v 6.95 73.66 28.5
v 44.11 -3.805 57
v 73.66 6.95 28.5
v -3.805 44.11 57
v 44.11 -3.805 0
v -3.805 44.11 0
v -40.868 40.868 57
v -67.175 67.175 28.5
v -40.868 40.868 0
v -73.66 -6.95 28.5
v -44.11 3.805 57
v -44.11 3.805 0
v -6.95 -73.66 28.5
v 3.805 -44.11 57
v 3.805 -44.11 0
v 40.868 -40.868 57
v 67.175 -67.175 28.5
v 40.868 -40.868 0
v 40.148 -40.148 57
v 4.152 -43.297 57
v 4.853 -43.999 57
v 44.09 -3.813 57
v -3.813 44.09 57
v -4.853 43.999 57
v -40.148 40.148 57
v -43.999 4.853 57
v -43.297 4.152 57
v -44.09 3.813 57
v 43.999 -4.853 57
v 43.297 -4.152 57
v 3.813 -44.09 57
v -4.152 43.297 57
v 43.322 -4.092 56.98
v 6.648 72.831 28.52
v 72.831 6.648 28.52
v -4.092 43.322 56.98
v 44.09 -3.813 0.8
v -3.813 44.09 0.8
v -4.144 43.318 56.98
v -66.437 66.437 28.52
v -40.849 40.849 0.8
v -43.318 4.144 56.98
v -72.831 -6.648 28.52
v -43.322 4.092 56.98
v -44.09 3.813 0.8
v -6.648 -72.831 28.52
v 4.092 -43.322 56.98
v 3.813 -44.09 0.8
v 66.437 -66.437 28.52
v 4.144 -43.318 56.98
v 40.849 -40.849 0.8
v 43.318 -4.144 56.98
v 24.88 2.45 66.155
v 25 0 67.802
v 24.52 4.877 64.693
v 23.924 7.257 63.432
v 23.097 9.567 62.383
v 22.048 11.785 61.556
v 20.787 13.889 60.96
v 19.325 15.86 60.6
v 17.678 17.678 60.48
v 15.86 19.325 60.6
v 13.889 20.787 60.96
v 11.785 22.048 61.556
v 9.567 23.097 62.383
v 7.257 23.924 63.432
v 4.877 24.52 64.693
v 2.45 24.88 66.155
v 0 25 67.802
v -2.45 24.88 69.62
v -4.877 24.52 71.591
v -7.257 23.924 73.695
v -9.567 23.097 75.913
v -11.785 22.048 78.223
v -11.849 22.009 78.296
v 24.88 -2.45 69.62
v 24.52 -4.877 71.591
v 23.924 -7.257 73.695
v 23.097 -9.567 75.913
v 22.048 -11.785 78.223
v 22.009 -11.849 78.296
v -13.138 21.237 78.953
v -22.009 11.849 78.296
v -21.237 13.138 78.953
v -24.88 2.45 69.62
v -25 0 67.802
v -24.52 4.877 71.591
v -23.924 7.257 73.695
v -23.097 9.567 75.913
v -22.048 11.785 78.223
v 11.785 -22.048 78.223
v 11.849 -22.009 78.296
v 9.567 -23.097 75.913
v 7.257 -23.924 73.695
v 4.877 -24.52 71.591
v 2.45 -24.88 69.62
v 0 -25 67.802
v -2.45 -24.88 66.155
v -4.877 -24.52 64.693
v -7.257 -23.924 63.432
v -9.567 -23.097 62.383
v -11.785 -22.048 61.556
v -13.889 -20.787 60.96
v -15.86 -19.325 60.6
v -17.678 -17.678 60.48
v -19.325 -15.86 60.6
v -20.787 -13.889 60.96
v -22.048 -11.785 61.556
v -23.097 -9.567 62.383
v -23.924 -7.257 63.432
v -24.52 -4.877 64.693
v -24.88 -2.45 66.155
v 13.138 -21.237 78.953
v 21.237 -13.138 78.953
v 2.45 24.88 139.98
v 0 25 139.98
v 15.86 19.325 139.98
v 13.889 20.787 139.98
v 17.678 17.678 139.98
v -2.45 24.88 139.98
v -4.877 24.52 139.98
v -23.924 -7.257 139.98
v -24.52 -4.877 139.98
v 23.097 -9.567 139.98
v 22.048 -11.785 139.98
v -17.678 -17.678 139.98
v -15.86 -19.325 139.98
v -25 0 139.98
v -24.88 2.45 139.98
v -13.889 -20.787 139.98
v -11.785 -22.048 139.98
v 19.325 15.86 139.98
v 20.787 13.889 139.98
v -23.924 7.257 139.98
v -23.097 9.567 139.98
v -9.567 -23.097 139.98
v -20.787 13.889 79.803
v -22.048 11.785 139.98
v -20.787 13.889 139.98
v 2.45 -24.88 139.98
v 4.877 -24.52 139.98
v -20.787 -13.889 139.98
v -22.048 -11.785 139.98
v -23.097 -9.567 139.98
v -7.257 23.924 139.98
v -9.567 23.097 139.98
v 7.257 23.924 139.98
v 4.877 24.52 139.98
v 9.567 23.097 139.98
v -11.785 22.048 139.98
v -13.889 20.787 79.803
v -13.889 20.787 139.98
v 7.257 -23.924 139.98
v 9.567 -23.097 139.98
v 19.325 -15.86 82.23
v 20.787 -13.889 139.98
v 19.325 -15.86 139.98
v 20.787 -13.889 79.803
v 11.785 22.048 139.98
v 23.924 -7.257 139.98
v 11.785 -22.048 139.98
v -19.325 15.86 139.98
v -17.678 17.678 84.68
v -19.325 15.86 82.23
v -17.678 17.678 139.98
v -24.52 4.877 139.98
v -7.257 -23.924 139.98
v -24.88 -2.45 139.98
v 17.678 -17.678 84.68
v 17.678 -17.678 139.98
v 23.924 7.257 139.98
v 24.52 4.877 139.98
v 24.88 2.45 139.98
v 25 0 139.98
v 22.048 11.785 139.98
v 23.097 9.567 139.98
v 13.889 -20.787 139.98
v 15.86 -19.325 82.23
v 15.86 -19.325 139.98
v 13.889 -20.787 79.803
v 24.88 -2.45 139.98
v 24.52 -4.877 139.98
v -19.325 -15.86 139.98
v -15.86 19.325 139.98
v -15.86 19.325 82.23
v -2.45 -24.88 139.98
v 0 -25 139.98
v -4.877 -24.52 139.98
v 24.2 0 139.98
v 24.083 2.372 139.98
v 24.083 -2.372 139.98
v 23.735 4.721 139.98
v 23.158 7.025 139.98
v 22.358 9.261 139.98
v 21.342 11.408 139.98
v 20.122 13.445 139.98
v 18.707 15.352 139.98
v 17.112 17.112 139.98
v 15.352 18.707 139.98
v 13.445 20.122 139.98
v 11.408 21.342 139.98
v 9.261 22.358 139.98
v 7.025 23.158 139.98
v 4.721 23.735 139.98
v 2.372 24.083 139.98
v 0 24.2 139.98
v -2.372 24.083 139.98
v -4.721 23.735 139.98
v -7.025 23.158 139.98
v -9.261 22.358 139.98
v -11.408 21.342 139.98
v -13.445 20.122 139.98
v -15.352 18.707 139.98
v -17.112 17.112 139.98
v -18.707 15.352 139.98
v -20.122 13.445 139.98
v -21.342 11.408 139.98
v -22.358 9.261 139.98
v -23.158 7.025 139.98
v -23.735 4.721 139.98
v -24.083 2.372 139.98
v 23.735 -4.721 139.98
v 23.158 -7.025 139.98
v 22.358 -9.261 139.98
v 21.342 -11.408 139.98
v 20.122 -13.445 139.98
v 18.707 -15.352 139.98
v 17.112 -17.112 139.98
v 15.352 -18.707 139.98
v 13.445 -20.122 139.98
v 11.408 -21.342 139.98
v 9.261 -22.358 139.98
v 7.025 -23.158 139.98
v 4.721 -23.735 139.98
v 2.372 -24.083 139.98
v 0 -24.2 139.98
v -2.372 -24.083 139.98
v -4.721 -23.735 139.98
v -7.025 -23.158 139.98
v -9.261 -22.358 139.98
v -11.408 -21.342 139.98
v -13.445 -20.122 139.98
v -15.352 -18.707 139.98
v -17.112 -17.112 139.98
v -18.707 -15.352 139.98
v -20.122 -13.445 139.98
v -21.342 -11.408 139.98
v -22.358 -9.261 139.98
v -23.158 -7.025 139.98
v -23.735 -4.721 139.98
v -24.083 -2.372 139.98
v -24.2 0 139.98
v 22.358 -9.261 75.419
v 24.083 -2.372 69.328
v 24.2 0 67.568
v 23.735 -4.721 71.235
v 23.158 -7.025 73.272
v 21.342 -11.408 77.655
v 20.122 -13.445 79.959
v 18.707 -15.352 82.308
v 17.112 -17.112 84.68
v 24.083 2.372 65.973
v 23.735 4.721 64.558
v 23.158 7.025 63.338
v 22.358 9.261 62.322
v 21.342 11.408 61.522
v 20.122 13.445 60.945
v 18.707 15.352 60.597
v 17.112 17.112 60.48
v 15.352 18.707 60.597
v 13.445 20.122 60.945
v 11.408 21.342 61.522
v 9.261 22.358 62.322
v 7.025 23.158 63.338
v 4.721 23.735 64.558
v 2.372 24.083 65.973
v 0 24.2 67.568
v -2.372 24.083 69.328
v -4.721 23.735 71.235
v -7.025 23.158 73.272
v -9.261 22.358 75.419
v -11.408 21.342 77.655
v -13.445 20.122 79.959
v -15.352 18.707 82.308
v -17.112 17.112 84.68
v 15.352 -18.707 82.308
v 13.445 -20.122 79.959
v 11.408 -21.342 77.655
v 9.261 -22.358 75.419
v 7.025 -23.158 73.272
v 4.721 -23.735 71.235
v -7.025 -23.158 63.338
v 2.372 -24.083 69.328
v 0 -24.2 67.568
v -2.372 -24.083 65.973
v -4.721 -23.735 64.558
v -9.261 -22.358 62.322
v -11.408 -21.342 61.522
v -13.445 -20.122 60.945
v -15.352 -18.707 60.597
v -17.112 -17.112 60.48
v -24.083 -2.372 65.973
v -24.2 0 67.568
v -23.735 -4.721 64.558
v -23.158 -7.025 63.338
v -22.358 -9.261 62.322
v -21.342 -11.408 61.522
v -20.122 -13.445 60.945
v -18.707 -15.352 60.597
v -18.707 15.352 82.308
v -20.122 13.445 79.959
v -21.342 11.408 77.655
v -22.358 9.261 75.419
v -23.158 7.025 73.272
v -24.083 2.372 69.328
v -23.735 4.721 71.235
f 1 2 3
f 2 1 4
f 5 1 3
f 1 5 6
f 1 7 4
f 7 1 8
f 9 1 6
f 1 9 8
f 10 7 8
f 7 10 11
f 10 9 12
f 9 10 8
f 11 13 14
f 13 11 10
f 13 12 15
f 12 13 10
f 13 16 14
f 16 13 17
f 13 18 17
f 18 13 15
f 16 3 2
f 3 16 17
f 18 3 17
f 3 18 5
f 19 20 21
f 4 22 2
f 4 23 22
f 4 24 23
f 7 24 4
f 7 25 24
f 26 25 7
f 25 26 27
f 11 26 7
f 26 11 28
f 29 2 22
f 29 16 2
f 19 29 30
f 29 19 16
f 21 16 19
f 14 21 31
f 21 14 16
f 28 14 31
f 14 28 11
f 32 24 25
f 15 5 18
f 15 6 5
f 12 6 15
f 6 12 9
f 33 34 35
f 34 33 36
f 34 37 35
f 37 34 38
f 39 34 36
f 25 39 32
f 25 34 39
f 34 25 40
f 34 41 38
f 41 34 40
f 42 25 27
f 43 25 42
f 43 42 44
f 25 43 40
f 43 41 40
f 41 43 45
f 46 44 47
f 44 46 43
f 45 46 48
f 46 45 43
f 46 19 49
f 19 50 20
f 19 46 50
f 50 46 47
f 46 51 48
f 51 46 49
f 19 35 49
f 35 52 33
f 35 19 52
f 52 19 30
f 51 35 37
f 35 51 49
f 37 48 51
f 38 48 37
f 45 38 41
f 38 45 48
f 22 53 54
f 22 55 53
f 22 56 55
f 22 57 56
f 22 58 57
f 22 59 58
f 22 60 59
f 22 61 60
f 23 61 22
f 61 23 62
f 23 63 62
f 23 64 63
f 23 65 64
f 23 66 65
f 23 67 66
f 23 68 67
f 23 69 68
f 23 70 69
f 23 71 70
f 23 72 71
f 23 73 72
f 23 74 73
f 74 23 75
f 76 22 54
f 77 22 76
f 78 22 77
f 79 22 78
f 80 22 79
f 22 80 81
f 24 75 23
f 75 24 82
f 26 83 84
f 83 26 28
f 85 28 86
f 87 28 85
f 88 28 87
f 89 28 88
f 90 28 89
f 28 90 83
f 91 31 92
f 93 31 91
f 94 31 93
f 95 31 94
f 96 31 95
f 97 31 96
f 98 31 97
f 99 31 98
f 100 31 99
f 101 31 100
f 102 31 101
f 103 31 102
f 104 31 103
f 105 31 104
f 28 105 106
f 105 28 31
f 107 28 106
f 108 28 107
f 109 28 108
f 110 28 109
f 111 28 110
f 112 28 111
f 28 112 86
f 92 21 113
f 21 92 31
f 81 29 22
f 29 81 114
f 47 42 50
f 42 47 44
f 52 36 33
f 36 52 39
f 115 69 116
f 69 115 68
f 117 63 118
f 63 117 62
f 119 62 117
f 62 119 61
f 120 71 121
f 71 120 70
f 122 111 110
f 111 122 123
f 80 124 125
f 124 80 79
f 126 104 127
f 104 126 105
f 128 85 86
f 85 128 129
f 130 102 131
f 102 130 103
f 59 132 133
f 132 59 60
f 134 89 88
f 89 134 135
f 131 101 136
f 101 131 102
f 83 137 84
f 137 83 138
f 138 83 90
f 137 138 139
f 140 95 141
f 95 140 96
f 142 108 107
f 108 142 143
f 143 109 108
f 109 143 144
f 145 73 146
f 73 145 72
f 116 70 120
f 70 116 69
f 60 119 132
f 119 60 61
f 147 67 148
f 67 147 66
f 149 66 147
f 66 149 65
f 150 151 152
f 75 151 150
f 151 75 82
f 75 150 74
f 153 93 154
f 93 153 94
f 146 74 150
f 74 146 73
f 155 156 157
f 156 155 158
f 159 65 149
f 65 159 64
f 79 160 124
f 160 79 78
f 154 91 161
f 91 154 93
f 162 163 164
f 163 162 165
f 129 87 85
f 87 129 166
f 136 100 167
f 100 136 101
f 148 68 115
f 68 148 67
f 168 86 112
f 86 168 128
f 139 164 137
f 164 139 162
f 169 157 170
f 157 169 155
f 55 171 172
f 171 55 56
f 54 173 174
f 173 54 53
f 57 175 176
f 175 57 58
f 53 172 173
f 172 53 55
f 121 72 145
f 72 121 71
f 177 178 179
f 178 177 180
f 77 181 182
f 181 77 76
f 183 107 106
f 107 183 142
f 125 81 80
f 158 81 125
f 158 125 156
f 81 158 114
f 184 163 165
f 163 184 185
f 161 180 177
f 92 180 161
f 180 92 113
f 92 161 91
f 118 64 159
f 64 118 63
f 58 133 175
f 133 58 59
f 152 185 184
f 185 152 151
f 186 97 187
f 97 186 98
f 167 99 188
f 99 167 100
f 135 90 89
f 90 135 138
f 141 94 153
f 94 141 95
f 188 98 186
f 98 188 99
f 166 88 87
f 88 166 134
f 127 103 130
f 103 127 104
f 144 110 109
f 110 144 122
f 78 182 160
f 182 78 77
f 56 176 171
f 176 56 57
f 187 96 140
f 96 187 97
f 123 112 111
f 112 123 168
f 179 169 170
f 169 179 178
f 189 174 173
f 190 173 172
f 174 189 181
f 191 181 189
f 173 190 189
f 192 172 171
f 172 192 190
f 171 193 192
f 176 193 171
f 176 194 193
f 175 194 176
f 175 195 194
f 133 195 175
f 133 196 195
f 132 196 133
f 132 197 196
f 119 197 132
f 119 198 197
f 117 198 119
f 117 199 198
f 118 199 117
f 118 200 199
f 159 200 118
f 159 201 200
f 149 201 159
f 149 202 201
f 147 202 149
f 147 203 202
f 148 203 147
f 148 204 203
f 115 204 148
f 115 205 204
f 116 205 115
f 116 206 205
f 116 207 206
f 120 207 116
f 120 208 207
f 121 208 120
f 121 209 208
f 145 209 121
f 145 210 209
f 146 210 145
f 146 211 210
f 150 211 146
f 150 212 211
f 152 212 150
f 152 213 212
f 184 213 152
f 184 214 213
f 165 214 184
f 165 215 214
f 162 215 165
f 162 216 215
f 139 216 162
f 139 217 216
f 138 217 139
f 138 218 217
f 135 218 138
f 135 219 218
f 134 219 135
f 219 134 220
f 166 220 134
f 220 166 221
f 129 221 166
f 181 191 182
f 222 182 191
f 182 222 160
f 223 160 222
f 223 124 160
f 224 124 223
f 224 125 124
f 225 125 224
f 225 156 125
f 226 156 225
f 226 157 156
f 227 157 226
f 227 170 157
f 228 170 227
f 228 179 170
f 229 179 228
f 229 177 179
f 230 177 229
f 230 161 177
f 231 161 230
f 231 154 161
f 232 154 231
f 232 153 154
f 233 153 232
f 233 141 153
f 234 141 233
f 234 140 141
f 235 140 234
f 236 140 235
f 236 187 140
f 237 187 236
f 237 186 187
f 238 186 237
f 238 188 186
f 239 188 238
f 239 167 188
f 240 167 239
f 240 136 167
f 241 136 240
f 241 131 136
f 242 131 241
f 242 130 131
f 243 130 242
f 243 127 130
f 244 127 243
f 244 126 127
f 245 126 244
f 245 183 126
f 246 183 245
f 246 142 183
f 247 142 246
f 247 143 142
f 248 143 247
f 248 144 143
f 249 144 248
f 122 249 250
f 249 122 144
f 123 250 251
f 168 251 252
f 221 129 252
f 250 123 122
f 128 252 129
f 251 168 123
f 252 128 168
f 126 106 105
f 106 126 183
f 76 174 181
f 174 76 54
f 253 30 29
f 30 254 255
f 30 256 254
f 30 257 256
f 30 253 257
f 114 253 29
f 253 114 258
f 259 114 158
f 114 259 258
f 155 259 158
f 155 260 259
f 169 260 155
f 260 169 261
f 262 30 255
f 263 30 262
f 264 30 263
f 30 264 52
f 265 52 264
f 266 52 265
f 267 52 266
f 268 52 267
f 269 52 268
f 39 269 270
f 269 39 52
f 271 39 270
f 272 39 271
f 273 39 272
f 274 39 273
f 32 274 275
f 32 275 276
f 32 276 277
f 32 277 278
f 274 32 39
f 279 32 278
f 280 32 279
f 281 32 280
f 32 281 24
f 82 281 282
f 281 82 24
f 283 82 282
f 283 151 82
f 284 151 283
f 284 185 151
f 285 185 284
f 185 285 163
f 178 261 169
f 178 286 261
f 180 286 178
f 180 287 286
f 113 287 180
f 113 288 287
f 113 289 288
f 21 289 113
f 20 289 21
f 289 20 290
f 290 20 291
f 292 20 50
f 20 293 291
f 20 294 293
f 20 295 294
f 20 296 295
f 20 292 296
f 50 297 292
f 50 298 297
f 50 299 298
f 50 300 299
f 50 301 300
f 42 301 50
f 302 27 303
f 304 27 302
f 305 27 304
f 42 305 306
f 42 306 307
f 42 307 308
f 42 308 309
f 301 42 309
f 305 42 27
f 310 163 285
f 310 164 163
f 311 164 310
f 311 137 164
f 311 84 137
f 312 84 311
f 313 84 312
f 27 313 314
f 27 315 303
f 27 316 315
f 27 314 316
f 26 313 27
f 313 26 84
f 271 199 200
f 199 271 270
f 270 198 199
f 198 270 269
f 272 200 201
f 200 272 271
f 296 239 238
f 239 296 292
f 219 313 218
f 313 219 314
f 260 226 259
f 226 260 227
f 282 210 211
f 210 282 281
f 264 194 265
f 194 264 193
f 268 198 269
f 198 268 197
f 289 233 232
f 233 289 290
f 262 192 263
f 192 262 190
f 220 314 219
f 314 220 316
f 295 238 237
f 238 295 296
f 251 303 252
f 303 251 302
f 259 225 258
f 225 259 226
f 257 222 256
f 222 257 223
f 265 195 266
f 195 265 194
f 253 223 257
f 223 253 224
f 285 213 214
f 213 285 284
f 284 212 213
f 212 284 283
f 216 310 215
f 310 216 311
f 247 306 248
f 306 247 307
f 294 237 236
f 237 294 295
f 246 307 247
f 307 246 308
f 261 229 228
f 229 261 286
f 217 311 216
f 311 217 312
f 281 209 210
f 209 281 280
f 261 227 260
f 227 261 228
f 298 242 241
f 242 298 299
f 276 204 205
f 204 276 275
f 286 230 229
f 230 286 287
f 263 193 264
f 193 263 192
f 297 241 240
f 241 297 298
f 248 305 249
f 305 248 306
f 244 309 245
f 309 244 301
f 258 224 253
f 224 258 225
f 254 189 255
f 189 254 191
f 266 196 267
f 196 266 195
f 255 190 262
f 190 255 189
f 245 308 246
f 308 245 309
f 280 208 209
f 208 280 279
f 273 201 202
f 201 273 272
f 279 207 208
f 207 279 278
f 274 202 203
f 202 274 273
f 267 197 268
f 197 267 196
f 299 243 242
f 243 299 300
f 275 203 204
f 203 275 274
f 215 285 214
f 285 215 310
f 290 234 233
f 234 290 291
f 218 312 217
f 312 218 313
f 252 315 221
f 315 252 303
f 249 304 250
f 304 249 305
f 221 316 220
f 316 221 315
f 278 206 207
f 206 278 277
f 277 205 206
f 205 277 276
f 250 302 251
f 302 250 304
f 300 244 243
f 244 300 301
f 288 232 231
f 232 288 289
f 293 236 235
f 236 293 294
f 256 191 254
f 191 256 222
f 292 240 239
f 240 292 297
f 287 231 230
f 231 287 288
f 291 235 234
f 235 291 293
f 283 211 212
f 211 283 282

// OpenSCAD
//----- Customizable constants

// preview[view:south, tilt:top]

/* [Printer/Slicer] */

// of the target printer
nozzle_diameter= 0.4;

// to be used by the slicer
layer_height= 0.2;

/* [Rupee Shape] */

rupee_length= 190;
rupee_edge_pitch= 45;
rupee_tip_angle= 100;
rupee_aspect_ratio= 0.6;
rupee_center_facet_ratio= 0.5;

rupee_bowl_wall_count= 2;
rupee_bowl_floor_count= 4; // NOTE: An even number of layers promotes symmetry on the central facet.

/* [Light Socket Connector] */

rupee_shade_total_height= 140;

light_socket_connector_top_diameter= 50;
light_socket_connector_face_count= 64;

/* [Hidden] */

// The connector slits was both unnecessary and created problems while printing.
light_socket_connector_slit_xy_size= 0; // 0 will remove the slit entirely. 

// The magnets turned out to be unnecessary, so it's completely untested.
light_socket_connector_magnet_count= 0;
magnet_diameter= 5.0;
magnet_socket_xy_gap= 0.1;
magnet_socket_z_gap= 0.2;
magnet_socket_wall_count= 2;
magnet_socket_floor_count= 2;
magnet_socket_ceiling_count= 2; // Either 0 if glueing in magnets, or just thick enough to ensure the magnets are contained.
magnet_socket_support_pitch= 45;
magnet_socket_face_count= 64;

//----- Private constants

function hidden(x)= x; // Used to hide values from the customizer app.

csg_overlap= hidden(0.02);

rupee_bowl_wall_xy_size= (nozzle_diameter * rupee_bowl_wall_count);
rupee_bowl_floor_z_size= (layer_height * rupee_bowl_floor_count);

rupee_y_size= rupee_length;
rupee_x_size= (rupee_y_size * rupee_aspect_ratio);

rupee_center_facet_x_size= (rupee_center_facet_ratio * rupee_x_size);

rupee_edge_facet_x_size= ((rupee_x_size / 2) - (rupee_center_facet_x_size / 2));
rupee_edge_facet_z_size= (rupee_edge_facet_x_size * tan(rupee_edge_pitch));

rupee_z_size= (2 * rupee_edge_facet_z_size);

rupee_max_size= (max(rupee_x_size, rupee_y_size, rupee_z_size) + (2 * csg_overlap));

light_socket_connector_z_size= (rupee_shade_total_height - rupee_z_size);

light_socket_connector_top_radius= (light_socket_connector_top_diameter / 2);

magnet_socket_cavity_xy_radius= ((magnet_diameter / 2) + magnet_socket_xy_gap);
magnet_socket_cavity_z_size= (magnet_socket_z_gap + magnet_diameter + magnet_socket_z_gap);
magnet_socket_wall_xy_size= (nozzle_diameter * magnet_socket_wall_count);
magnet_socket_floor_z_size= (layer_height * magnet_socket_floor_count);
magnet_socket_ceiling_z_size= (layer_height * magnet_socket_ceiling_count);

magnet_socket_xy_radius= (magnet_socket_cavity_xy_radius + magnet_socket_wall_xy_size);
magnet_socket_z_size= (magnet_socket_floor_z_size + magnet_socket_cavity_z_size + magnet_socket_ceiling_z_size);

magnet_socket_support_z_size= ((2 * magnet_socket_xy_radius) * tan(magnet_socket_support_pitch));

//----- Information

echo("rupee_center_facet_x_size:", rupee_center_facet_x_size);
echo("rupee_z_size:", rupee_z_size);
echo("magnet_insertion pause_at_z:", (rupee_shade_total_height - magnet_socket_ceiling_z_size));

//----- Implementation

module rupee_negative_top_edge()
{
	clipping_cube_x_size= (rupee_x_size / cos(rupee_edge_pitch));
	
	rotate([0, rupee_edge_pitch, 0])
	translate([-(clipping_cube_x_size / 2), -(rupee_max_size / 2), 0])
	cube(size= [
		clipping_cube_x_size,
		rupee_max_size,
		rupee_max_size]);
}

module rupee_negative_full_edge(
	xy_inset_size)
{
	translate([-xy_inset_size, 0, 0])
	{
		rupee_negative_top_edge();
		
		mirror([0, 0, 1])
		rupee_negative_top_edge();
	}
}

module rupee_negative_edges(
	xy_inset_size)
{
	// Right
	translate([(rupee_x_size / 2), 0, 0])
	rupee_negative_full_edge(xy_inset_size);
	
	// Top-Right
	translate([0, (rupee_y_size / 2), 0])
	rotate([0, 0, (rupee_tip_angle / 2)])
	rupee_negative_full_edge(xy_inset_size);
	
	// Top-Left
	translate([0, (rupee_y_size / 2), 0])
	mirror([1, 0, 0])
	rotate([0, 0, (rupee_tip_angle / 2)])
	rupee_negative_full_edge(xy_inset_size);
	
	// Left
	translate([-(rupee_x_size / 2), 0, 0])
	mirror([1, 0, 0])
	rupee_negative_full_edge(xy_inset_size);
	
	// Bottom-Left
	translate([0, -(rupee_y_size / 2), 0])
	mirror([1, 0, 0])
	rotate([0, 0, -(rupee_tip_angle / 2)])
	rupee_negative_full_edge(xy_inset_size);
	
	// Bottom-Right
	translate([0, -(rupee_y_size / 2), 0])
	rotate([0, 0, -(rupee_tip_angle / 2)])
	rupee_negative_full_edge(xy_inset_size);
}

module rupee_solid(
	xy_inset_size)
{
	translate([0, 0, (rupee_z_size / 2)])
	difference()
	{
		cube(
			size= [rupee_x_size, rupee_y_size, rupee_z_size],
			center= true);
		
		rupee_negative_edges(xy_inset_size= xy_inset_size);
	}
}

module rupee_bowl()
{
	difference()
	{
		rupee_solid(xy_inset_size= 0);
		
		difference()
		{
			translate([0, 0, csg_overlap])
			rupee_solid(
				xy_inset_size= rupee_bowl_wall_xy_size);
			
			translate([-(rupee_max_size / 2), -(rupee_max_size / 2), 0])
			cube(size= [
				rupee_max_size,
				rupee_max_size,
				rupee_bowl_floor_z_size]);
		}
	}
}

module magnet_socket()
{
	difference()
	{
		translate([
			-magnet_socket_xy_radius,
			0,
			-(magnet_socket_z_size + magnet_socket_support_z_size)])
		union()
		{
			cylinder(
				r= magnet_socket_xy_radius,
				h= (magnet_socket_z_size + magnet_socket_support_z_size),
				$fn= magnet_socket_face_count);
			
			translate([0, -magnet_socket_xy_radius, 0])
			cube(size= [
				magnet_socket_xy_radius,
				(2 * magnet_socket_xy_radius), 
				(magnet_socket_z_size + magnet_socket_support_z_size)]);
		}
		
		// Magnet cavity.
		translate([
			-magnet_socket_xy_radius,
			0,
			-(magnet_socket_cavity_z_size + magnet_socket_ceiling_z_size)])
		cylinder(
			r= magnet_socket_cavity_xy_radius,
			h= magnet_socket_cavity_z_size,
			$fn= magnet_socket_face_count);
			
		// Support bevel
		translate([
			-(2 * magnet_socket_xy_radius),
			0,
			-magnet_socket_z_size])
		rotate([0, -(90 - magnet_socket_support_pitch), 0])
		translate([
			-magnet_socket_support_z_size,
			-magnet_socket_xy_radius,
			-(2 * magnet_socket_support_z_size)])
		translate([0, -csg_overlap, 0])
		cube(size= [
			magnet_socket_support_z_size,
			((2 * magnet_socket_xy_radius) + (2 * csg_overlap)),
			(2 * magnet_socket_support_z_size)]);
	}
}

module light_socket_connector_exterior()
{
	cylinder(
		r= light_socket_connector_top_radius,
		h= light_socket_connector_z_size,
		$fn= light_socket_connector_face_count);
		
	difference()
	{
		translate([
			-(rupee_center_facet_x_size / 2),
			-(rupee_y_size / 2),
			0])
		cube(size= [
			rupee_center_facet_x_size,
			rupee_y_size,
			min((rupee_z_size / 2), light_socket_connector_z_size)]);
		
		translate([0, 0, -(rupee_z_size / 2)])
		rupee_negative_edges(xy_inset_size= 0);
	}
}

module light_socket_connector_negative_interior()
{
	translate([0, 0, -csg_overlap])
	cylinder(
		r= (light_socket_connector_top_radius - rupee_bowl_wall_xy_size),
		h= (csg_overlap + light_socket_connector_z_size + csg_overlap),
		$fn= light_socket_connector_face_count);
			
	intersection()
	{
		// Base X-Positive
		translate([((rupee_center_facet_x_size / 2) - rupee_bowl_wall_xy_size), 0, 0])
		rotate([0, -(90 - rupee_edge_pitch), 0])
		mirror([1, 0, 0])
		translate([0, -(rupee_max_size / 2), 0])
		cube(size= rupee_max_size);
		
		// Base X-Negative
		mirror([1, 0, 0])
		translate([((rupee_center_facet_x_size / 2) - rupee_bowl_wall_xy_size), 0, 0])
		rotate([0, -(90 - rupee_edge_pitch), 0])
		mirror([1, 0, 0])
		translate([0, -(rupee_max_size / 2), 0])
		cube(size= rupee_max_size);
	}
	
	// If the user needs the connector to be split to
	// allow the bulb to pass through.
	if (light_socket_connector_slit_xy_size > 0)
	{
		translate([
			-(light_socket_connector_slit_xy_size / 2),
			-(rupee_max_size / 2),
			0])
		cube(size= [
			light_socket_connector_slit_xy_size,
			rupee_max_size,
			(light_socket_connector_z_size + csg_overlap)]);
	}
}

module light_socket_connector_magnet_sockets()
{
	magnet_placement_angle= (360 / light_socket_connector_magnet_count);
	
	// NOTE: We must perform this check, otherwise the
	// culling-cylinder will become the only child passed
	// to intersection().
	if (light_socket_connector_magnet_count > 0)
	{
		intersection()
		{
			translate([0, 0, light_socket_connector_z_size])
			union()
			{
				for (index= [0 : (light_socket_connector_magnet_count - 1)])
				{
					rotate([0, 0, (90 + (index * magnet_placement_angle) + (magnet_placement_angle / 2))])
					translate([csg_overlap, 0, 0])
					translate([(light_socket_connector_top_radius - rupee_bowl_wall_xy_size), 0, 0])
					magnet_socket();
				}
			}
			
			// Ensure the magnet sockets don't poke out.
			cylinder(
				r= light_socket_connector_top_radius,
				h= light_socket_connector_z_size,
				$fn= light_socket_connector_face_count);
		}
	}
}

module light_socket_connector_whole()
{
	union()
	{
		difference()
		{
			light_socket_connector_exterior();
			
			light_socket_connector_negative_interior();
		}
		
		light_socket_connector_magnet_sockets();
	}
}

module rupee_shade()
{
	union()
	{
		rupee_bowl();

		translate([0, 0, -csg_overlap])
		translate([0, 0, rupee_z_size])
		light_socket_connector_whole();
	}
}

//----- Output

rotate([0, 0, 45]) // Rotate to better fit in the printer, while keeping the bottom-fill symmetrical to look nice. (could fit better with a different angle, but the bottom surface would be asymmetrical)
//rupee_bowl();
//light_socket_connector_whole();
rupee_shade();
